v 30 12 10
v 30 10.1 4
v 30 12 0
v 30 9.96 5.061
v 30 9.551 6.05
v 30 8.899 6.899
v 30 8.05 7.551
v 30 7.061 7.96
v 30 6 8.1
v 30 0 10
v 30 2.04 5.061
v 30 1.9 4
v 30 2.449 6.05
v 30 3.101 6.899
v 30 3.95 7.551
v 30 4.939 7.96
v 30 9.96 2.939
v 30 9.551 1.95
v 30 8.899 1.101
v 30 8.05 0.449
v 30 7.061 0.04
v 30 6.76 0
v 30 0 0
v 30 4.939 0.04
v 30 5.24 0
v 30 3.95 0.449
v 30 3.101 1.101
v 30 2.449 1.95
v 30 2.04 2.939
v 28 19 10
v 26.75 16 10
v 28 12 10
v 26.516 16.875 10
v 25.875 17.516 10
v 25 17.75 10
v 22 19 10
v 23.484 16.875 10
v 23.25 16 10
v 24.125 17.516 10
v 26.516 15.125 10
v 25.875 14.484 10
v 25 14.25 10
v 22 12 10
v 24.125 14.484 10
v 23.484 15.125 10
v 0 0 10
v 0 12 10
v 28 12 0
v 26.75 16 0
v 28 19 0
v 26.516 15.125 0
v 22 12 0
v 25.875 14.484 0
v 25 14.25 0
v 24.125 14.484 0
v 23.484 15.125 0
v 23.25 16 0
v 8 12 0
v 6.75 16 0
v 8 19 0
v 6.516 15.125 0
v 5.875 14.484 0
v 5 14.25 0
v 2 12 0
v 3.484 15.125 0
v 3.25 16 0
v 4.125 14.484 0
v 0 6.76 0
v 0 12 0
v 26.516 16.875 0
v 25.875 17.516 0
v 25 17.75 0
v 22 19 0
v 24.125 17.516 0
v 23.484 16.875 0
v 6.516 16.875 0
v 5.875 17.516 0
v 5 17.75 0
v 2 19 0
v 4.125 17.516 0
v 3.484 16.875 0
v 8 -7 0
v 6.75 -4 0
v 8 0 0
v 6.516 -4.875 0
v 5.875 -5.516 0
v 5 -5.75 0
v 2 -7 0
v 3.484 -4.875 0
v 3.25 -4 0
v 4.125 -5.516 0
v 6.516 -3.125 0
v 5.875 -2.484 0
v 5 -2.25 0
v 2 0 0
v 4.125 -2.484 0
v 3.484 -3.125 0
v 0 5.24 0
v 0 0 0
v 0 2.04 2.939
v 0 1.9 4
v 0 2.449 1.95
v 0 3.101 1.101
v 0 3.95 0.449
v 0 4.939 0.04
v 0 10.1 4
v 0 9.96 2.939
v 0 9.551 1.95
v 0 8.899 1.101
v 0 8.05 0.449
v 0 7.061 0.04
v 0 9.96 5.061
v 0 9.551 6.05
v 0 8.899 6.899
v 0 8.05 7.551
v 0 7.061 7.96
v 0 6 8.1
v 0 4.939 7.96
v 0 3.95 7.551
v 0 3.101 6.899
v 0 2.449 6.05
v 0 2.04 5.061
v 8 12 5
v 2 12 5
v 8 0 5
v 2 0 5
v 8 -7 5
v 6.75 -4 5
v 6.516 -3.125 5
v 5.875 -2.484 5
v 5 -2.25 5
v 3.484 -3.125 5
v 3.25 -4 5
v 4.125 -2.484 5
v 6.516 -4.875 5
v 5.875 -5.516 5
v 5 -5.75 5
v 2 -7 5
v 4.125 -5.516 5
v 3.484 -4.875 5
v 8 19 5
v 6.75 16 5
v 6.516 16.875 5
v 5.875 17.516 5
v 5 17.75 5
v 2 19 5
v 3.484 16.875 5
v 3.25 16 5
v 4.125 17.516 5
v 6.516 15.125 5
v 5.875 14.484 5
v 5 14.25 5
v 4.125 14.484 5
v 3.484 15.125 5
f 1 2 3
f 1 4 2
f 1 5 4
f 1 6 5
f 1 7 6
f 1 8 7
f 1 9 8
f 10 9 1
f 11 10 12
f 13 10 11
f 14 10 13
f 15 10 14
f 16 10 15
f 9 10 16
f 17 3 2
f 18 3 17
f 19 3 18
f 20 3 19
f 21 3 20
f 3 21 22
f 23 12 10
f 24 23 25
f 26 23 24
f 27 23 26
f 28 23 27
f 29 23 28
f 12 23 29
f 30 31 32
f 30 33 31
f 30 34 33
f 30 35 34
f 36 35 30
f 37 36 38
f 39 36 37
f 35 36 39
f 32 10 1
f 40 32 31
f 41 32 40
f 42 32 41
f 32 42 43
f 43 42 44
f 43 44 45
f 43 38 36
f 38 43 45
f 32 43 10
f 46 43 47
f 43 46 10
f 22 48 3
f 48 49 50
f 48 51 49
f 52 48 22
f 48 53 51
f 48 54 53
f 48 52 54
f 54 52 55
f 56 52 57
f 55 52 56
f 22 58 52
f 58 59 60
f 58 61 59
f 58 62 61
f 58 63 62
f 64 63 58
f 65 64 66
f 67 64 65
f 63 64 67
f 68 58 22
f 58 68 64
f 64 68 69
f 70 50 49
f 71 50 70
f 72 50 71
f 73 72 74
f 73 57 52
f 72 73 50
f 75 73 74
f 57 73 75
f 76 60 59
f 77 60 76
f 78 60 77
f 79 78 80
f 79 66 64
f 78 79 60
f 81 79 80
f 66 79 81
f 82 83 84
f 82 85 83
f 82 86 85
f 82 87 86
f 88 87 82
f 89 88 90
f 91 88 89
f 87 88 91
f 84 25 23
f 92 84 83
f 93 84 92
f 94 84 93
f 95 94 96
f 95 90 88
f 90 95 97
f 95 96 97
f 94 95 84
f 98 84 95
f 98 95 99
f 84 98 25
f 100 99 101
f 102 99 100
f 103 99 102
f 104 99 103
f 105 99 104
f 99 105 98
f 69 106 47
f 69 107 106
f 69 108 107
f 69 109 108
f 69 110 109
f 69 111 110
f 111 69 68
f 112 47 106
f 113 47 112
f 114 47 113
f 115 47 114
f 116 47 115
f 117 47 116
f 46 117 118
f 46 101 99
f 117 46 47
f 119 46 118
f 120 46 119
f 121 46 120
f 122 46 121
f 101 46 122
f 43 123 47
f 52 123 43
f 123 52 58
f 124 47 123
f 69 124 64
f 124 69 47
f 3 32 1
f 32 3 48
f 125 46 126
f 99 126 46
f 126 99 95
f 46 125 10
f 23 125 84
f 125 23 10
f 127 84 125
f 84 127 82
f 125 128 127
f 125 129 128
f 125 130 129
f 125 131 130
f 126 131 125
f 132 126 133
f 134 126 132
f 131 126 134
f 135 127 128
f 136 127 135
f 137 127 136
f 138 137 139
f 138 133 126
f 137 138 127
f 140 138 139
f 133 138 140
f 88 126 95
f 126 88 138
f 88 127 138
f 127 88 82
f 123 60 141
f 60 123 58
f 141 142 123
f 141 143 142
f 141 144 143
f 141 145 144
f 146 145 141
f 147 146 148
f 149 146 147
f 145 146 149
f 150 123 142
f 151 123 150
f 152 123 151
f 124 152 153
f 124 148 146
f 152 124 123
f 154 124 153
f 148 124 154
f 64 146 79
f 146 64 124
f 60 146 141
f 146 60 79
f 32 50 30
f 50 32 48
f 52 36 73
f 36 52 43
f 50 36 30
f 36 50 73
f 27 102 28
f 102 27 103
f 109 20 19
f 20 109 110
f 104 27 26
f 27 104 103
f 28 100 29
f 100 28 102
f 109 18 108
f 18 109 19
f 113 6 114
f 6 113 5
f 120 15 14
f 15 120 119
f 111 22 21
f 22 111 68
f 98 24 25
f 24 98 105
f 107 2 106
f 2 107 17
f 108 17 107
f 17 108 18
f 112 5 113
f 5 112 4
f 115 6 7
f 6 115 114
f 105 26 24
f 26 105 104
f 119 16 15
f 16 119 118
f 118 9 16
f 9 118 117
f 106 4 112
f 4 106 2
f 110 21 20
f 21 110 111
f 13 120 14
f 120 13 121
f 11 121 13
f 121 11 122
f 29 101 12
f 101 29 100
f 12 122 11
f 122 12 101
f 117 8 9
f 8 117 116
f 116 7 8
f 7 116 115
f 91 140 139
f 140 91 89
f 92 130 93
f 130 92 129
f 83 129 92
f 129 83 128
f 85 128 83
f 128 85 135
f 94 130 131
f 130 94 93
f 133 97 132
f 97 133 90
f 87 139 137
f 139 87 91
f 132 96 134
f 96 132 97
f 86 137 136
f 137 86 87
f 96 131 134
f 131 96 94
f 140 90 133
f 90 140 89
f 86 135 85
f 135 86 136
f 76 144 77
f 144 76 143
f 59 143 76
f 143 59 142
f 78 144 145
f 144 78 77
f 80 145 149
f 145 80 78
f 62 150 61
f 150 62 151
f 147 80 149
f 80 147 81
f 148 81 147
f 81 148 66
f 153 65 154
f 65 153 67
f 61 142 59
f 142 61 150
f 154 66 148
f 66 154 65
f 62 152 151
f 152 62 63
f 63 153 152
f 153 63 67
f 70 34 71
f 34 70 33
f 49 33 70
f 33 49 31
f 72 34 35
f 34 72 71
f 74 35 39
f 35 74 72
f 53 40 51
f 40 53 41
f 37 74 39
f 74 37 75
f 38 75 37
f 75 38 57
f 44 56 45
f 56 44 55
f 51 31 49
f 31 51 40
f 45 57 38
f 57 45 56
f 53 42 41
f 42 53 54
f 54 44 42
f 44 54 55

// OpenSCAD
difference()
{
    union()
    {
        cube([30,12,10]);
        
        translate([2,-4-3,0])
            cube([6,8,5]);
            //cylinder(d=3.5,h=4,$fn=12);
        translate([2,11,0])
            cube([6,8,5]);
        translate([2+20,11,0])
            cube([6,8,10]);
    }
    union()
    {
        translate([0,6,4])
            rotate([0,90,0])
                cylinder(d=8.2,h=30,$fn=24);
        
        translate([5,-4,0])
            cylinder(d=3.5,h=10,$fn=12);
        translate([5,6+6+4,0])
            cylinder(d=3.5,h=10,$fn=12);
        translate([5+20,6+6+4,0])
            cylinder(d=3.5,h=10,$fn=12);
    }
}
